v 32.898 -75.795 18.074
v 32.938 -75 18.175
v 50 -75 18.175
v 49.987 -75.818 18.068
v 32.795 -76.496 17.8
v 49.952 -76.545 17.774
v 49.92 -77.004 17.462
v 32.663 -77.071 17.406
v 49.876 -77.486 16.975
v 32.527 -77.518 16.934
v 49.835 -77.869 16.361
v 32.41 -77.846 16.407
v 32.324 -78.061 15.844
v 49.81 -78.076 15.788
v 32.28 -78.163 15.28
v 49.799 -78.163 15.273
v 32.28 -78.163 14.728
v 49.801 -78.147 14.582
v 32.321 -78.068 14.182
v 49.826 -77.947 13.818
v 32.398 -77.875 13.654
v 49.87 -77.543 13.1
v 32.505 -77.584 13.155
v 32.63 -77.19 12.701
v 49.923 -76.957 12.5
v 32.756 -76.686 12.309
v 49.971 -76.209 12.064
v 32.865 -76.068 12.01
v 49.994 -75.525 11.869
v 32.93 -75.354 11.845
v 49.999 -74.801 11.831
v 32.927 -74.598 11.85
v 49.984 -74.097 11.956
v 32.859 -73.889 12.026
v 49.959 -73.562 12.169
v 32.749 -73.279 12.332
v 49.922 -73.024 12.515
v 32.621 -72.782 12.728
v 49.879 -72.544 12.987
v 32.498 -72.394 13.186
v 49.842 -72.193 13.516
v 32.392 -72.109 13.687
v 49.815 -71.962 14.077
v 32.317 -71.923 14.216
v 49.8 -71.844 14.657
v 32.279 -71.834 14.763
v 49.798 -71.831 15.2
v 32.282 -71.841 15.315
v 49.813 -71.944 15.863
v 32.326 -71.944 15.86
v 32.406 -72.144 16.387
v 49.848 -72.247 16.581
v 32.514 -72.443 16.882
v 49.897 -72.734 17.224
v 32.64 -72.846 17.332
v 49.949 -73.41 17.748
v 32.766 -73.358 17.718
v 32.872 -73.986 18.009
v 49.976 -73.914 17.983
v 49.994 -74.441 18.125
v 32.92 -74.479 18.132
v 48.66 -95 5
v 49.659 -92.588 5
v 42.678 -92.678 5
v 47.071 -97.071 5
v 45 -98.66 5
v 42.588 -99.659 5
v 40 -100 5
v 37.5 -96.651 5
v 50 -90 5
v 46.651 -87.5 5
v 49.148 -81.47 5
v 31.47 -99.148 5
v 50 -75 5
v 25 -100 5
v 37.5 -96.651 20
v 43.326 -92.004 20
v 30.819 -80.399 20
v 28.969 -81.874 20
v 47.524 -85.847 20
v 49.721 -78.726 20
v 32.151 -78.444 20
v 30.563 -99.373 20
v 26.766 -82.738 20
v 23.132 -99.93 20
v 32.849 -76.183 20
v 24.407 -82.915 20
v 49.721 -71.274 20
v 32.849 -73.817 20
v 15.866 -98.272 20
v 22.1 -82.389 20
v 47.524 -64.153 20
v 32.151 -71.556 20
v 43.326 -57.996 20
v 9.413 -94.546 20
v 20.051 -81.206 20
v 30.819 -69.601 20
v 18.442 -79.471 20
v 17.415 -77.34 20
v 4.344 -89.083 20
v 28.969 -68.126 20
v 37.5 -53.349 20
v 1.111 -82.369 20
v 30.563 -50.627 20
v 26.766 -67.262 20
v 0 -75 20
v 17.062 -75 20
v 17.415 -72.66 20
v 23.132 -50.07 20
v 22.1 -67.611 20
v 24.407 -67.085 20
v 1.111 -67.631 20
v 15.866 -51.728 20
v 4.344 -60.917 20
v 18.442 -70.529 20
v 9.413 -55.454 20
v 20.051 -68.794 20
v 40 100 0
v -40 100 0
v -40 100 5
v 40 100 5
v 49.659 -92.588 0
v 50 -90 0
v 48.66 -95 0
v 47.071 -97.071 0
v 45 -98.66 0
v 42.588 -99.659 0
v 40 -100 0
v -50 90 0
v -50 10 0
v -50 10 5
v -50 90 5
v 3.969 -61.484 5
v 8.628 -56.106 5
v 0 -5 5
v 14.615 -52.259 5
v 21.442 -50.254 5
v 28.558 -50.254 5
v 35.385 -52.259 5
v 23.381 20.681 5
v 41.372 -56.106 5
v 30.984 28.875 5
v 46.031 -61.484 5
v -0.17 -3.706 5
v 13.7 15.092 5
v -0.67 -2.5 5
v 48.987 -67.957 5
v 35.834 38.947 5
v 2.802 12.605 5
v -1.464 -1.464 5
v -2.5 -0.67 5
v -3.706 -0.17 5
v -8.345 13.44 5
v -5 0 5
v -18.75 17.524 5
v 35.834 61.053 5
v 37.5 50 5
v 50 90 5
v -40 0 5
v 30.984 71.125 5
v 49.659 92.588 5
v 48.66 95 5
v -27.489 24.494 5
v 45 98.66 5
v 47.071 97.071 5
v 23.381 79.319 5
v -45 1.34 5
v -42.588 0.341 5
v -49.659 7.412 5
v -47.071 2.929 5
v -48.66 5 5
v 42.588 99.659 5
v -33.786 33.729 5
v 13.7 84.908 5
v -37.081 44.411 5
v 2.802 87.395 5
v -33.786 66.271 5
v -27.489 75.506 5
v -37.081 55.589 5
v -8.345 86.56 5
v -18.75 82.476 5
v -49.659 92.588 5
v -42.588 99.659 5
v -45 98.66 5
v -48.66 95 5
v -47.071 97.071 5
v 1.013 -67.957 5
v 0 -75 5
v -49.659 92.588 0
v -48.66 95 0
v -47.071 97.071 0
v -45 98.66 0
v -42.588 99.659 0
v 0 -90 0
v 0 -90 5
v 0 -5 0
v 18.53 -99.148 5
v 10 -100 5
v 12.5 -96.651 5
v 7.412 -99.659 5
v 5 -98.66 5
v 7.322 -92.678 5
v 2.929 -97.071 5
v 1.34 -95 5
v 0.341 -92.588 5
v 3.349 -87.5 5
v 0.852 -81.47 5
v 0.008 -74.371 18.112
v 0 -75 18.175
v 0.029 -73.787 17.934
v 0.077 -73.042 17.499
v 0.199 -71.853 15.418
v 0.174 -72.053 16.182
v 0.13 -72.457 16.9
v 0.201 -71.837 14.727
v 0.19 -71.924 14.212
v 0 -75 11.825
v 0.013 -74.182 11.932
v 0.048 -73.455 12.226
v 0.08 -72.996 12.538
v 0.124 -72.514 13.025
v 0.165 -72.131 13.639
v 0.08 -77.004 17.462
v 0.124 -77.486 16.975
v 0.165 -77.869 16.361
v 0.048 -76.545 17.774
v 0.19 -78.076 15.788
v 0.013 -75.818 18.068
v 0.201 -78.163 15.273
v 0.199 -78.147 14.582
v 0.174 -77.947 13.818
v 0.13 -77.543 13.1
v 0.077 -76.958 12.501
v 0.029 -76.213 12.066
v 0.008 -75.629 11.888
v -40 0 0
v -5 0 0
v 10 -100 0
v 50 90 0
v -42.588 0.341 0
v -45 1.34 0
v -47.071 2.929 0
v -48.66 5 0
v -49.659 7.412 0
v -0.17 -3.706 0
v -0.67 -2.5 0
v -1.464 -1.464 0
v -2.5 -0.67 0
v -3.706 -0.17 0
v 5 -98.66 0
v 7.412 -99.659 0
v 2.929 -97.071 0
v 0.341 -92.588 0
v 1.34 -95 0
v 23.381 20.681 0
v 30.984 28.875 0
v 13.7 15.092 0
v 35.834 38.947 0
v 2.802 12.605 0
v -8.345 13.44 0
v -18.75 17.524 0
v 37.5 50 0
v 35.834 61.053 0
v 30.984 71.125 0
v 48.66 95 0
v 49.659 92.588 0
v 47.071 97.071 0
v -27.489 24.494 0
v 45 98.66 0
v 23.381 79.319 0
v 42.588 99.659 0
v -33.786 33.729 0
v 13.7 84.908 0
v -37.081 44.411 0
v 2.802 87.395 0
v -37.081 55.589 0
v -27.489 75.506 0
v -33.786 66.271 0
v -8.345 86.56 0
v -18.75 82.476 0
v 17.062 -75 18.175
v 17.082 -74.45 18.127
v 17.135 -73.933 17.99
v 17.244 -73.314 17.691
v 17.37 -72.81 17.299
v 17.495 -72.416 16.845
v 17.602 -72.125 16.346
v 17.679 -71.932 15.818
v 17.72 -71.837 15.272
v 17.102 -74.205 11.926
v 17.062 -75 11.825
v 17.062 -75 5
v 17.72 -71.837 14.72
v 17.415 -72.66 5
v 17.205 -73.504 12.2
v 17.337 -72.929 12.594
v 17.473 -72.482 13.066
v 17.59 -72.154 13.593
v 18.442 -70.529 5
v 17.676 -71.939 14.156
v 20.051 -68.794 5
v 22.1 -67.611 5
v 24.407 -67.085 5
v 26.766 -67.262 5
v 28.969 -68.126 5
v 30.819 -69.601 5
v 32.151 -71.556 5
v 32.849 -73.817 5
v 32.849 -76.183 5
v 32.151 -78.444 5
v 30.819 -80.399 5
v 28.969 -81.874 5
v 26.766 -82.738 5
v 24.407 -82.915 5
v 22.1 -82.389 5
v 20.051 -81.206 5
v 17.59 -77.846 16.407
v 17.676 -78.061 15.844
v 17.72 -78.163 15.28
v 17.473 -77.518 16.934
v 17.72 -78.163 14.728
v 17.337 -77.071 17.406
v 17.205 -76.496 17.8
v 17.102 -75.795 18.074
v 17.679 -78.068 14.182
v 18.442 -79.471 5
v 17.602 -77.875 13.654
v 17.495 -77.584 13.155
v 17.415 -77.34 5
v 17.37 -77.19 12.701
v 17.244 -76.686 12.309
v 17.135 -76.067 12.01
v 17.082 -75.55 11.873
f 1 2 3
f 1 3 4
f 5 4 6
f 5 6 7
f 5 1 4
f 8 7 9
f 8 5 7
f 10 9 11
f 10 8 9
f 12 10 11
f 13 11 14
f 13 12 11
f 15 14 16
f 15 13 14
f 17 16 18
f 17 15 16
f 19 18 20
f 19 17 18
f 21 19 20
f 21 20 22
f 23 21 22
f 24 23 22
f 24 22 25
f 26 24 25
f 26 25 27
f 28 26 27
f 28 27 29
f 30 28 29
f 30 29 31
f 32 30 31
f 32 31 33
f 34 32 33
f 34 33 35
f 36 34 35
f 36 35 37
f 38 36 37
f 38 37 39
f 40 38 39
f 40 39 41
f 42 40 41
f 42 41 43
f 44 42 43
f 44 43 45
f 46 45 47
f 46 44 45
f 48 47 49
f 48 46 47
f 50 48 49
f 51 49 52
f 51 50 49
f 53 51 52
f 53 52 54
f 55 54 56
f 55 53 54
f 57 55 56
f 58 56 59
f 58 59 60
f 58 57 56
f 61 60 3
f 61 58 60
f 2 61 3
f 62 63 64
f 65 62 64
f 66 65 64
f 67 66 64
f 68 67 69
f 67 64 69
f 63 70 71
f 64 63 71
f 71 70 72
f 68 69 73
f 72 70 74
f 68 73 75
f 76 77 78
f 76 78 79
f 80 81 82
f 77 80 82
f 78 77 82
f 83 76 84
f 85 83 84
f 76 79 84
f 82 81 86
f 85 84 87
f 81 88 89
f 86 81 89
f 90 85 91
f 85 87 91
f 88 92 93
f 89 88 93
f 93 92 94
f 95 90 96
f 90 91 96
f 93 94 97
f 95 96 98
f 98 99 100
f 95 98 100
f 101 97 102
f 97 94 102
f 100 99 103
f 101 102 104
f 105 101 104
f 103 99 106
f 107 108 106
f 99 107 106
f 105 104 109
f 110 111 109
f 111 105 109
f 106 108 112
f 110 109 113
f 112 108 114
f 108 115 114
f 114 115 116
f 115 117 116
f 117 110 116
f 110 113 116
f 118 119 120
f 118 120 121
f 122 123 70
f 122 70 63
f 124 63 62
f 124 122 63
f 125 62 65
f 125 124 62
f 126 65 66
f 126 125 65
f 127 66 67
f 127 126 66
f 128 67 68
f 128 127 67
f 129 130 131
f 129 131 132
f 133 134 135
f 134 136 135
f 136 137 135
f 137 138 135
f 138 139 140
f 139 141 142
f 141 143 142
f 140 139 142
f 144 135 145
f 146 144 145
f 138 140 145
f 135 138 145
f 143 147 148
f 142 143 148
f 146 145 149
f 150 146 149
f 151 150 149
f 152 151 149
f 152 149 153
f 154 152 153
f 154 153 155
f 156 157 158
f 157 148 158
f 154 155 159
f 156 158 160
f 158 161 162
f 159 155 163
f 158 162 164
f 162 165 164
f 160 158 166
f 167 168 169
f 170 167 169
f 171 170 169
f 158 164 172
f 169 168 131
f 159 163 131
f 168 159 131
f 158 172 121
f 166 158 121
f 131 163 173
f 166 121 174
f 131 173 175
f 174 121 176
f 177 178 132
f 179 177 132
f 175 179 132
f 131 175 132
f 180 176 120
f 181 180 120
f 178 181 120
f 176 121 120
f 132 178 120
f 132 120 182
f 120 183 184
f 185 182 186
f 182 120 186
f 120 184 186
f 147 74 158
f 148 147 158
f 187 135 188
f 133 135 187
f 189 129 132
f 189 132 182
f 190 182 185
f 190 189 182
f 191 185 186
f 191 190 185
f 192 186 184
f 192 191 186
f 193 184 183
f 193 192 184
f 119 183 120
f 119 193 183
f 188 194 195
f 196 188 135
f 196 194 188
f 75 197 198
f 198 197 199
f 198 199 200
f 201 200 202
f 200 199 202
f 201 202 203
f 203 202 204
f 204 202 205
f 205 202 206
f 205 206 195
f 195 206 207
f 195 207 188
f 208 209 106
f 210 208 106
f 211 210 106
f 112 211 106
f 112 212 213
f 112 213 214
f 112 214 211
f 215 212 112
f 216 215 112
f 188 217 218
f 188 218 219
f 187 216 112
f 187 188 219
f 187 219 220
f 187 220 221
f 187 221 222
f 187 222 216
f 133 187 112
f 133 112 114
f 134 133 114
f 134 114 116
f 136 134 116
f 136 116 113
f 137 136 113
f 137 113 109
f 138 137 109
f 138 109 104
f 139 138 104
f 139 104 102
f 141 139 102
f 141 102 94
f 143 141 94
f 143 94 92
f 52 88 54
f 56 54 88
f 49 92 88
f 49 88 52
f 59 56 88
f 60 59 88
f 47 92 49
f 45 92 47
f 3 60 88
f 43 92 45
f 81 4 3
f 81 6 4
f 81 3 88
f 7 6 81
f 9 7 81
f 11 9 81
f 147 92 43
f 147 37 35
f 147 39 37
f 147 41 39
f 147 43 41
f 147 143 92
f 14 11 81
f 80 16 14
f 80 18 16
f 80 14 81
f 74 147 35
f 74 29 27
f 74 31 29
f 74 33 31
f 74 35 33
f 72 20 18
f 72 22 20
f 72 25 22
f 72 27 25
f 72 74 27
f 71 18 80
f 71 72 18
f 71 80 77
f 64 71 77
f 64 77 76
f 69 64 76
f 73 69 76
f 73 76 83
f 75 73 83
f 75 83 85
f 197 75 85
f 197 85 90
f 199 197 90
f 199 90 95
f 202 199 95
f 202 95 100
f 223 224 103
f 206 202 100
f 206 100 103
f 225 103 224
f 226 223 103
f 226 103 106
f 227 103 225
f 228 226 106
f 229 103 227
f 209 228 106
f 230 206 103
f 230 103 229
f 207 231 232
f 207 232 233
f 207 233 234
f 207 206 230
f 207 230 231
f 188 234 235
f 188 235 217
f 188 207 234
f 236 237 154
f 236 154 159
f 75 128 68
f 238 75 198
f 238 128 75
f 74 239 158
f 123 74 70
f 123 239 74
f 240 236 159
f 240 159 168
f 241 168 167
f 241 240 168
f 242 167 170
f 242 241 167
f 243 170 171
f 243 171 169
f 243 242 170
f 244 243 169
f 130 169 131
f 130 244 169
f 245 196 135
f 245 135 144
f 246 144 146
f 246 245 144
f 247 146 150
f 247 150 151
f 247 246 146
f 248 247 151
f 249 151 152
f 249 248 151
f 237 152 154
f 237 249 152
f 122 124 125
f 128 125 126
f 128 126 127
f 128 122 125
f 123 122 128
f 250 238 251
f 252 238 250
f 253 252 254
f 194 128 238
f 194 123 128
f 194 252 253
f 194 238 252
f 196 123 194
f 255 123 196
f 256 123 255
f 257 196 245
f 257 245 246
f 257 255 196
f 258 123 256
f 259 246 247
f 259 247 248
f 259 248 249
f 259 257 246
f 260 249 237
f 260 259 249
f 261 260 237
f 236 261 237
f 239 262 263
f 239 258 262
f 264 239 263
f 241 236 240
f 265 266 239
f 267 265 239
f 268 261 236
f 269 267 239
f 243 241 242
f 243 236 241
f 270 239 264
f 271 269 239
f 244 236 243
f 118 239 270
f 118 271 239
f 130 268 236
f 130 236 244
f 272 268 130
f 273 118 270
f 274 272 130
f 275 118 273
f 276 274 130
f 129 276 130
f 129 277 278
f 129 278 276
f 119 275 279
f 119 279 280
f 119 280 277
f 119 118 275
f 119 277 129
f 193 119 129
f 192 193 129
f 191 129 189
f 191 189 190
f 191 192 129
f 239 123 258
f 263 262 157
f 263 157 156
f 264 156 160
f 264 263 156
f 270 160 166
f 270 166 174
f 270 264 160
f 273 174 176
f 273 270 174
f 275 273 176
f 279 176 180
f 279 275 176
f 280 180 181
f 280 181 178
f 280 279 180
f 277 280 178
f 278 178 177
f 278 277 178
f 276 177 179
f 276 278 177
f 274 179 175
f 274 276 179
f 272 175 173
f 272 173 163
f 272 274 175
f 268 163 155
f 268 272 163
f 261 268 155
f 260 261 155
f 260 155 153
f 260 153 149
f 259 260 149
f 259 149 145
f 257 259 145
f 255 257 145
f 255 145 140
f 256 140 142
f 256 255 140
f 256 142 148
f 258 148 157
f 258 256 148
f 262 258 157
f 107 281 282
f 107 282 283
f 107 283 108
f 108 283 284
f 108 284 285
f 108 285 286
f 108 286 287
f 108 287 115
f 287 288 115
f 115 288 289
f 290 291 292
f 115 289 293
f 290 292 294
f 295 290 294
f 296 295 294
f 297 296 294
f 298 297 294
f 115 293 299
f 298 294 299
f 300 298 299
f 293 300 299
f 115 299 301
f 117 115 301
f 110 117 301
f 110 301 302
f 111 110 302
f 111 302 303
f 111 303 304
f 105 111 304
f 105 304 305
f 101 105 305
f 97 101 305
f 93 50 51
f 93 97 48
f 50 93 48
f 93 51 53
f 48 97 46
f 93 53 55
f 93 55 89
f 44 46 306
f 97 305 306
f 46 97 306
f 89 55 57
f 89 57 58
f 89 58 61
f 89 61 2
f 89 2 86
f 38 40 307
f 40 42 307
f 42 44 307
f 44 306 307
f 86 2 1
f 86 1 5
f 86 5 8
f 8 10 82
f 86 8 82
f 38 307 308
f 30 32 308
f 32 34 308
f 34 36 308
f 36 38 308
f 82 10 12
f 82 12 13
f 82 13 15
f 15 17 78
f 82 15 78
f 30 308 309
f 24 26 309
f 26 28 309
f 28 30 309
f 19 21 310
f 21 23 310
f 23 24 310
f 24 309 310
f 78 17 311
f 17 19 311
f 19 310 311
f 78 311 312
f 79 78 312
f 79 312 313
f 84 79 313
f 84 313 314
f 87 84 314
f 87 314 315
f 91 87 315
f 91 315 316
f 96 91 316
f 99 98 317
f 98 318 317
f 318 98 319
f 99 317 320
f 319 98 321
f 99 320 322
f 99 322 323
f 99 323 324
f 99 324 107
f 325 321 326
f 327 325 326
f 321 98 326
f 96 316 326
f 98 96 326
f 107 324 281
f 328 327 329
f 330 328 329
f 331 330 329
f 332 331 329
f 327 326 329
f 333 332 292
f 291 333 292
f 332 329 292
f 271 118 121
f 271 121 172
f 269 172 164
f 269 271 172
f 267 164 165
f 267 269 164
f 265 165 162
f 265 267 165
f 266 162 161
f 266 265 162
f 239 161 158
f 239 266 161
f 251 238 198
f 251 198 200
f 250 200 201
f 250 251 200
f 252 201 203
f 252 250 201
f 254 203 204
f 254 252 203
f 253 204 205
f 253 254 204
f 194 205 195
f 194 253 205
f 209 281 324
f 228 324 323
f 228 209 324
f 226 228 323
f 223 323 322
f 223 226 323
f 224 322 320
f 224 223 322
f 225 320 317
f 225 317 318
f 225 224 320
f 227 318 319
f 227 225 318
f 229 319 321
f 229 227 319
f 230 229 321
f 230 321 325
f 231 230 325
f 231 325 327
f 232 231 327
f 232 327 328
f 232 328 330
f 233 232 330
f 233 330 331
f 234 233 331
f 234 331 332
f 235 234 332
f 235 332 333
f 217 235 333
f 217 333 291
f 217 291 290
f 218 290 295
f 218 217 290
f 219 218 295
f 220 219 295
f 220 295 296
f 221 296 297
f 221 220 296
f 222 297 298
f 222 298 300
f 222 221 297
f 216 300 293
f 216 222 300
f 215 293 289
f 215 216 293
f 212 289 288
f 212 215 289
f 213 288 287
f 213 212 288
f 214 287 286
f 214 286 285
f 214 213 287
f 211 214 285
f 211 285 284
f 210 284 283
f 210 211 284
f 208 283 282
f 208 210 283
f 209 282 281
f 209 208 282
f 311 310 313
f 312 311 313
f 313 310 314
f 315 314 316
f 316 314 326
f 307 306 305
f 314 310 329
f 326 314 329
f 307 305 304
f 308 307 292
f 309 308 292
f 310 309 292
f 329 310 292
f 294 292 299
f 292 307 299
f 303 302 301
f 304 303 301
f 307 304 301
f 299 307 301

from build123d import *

# Parameters (mm, degrees)
CROQUIS1_R              = 37.5
SALIENTE_EXTRUIR1_DEPTH = 5
CROQUIS2_R              = 25
CROQUIS2_R_2            = 7.9375
SALIENTE_EXTRUIR2_DEPTH = 20
CROQUIS3_R              = 3.175
CORTAR_EXTRUIR2_DEPTH   = 65


with BuildPart() as part:
    # Croquis1 → Saliente-Extruir1 (new body)
    with BuildSketch(Plane.XY):
        with BuildLine():
            Line((-5, 0), (-40, 0))
            ThreePointArc((-40, 0), (-47.071067812, 2.928932188), (-50, 10))
            Line((-50, 10), (-50, 90))
            ThreePointArc((-50, 90), (-47.071067812, 97.071067812), (-40, 100))
            Line((-40, 100), (40, 100))
            ThreePointArc((40, 100), (47.071067812, 97.071067812), (50, 90))
            Line((50, 90), (50, -90))
            ThreePointArc((50, -90), (47.071067812, -97.071067812), (40, -100))
            Line((40, -100), (10, -100))
            ThreePointArc((10, -100), (2.928932188, -97.071067812), (0, -90))
            Line((0, -90), (0, -5))
            ThreePointArc((0, -5), (-1.464466094, -1.464466094), (-5, 0))
        make_face()
        with Locations((0, 50)):
            Circle(CROQUIS1_R, mode=Mode.SUBTRACT)
    extrude(amount=SALIENTE_EXTRUIR1_DEPTH)

    # Croquis2 → Saliente-Extruir2 (add)
    with BuildSketch(Plane(origin=(0, 0, 0), x_dir=(-1, 0, 0), z_dir=(0, 0, -1))):
        with Locations((-25, -75)):
            Circle(CROQUIS2_R)
        with Locations((-25, -75)):
            Circle(CROQUIS2_R_2, mode=Mode.SUBTRACT)
    extrude(amount=-SALIENTE_EXTRUIR2_DEPTH)

    # Croquis3 → Cortar-Extruir2 (cut)
    with BuildSketch(Plane(origin=(0, 0, 0), x_dir=(0, 0, -1), z_dir=(1, 0, 0))):
        with Locations((10, -75)):
            Circle(CROQUIS3_R)
        with Locations(Location((-15, -75, 0), (0, 0, 180))):
            Circle(CROQUIS3_R)
    extrude(amount=CORTAR_EXTRUIR2_DEPTH, mode=Mode.SUBTRACT)


solid = part.part
